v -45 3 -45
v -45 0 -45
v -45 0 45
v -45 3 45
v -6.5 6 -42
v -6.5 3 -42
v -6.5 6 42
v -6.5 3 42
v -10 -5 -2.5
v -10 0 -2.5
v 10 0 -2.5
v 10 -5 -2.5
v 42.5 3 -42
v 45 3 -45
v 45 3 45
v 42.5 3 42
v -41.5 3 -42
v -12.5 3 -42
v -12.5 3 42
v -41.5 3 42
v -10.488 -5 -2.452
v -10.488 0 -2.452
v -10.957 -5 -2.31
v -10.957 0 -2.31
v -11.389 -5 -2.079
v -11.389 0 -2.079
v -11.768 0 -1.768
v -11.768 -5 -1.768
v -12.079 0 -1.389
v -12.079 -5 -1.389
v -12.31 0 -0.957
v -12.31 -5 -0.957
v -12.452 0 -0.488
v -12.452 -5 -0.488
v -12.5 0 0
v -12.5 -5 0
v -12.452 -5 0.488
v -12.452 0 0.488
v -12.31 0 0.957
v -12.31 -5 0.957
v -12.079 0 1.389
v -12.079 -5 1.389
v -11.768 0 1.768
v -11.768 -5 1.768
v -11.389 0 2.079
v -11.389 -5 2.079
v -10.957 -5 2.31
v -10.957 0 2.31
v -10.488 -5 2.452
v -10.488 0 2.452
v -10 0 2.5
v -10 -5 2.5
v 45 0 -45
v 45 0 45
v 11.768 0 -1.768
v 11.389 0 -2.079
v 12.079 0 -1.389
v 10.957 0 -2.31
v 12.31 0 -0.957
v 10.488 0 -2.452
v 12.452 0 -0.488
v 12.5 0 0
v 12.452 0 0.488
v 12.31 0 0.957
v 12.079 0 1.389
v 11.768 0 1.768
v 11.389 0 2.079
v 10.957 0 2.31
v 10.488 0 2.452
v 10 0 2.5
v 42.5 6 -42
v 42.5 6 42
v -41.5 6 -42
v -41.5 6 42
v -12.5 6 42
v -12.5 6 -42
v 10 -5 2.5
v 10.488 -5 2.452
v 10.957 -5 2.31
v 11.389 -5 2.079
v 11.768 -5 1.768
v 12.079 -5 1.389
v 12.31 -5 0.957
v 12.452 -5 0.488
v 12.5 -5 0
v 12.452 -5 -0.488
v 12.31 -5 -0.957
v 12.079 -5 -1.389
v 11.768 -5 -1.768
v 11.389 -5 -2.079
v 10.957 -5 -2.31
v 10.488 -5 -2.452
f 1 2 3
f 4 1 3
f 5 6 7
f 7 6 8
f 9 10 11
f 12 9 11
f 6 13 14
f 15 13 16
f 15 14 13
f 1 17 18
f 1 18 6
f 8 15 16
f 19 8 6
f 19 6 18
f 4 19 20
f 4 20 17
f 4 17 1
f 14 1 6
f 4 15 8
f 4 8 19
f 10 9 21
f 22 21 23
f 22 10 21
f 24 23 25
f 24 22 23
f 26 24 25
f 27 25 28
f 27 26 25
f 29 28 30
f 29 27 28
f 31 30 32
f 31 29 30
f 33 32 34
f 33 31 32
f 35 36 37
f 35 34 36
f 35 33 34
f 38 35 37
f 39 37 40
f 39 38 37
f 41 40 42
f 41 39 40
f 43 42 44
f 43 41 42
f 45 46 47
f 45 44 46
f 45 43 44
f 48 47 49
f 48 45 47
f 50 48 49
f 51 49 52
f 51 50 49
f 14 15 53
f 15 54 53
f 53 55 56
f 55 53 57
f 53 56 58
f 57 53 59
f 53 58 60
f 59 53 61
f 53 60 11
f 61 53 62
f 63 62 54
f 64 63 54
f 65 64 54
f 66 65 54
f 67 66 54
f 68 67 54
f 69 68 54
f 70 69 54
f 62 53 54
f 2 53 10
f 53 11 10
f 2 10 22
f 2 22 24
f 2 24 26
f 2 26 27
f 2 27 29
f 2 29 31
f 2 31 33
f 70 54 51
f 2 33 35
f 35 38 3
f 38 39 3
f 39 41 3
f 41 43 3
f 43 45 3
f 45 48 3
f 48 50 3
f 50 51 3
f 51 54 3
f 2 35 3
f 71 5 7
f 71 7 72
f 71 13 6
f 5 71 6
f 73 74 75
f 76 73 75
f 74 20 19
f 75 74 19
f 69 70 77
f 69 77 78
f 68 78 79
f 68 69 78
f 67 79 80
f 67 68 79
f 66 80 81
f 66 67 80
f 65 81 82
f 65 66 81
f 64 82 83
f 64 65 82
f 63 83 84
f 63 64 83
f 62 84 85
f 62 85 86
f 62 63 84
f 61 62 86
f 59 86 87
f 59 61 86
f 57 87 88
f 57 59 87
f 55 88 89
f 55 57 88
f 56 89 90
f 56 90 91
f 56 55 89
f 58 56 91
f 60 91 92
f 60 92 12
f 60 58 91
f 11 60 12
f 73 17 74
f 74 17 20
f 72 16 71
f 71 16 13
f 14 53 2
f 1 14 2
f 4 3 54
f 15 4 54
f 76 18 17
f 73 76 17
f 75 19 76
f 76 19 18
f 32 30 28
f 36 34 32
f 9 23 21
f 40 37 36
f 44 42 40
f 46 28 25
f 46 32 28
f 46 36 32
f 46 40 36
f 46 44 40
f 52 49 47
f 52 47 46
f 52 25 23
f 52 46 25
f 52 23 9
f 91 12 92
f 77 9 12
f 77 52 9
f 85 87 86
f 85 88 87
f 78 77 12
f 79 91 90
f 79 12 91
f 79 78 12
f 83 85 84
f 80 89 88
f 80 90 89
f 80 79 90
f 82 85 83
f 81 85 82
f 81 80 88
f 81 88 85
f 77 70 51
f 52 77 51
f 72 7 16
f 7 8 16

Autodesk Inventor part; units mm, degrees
ref_plane "YZ Plane" through (0, 0, 0) normal (1, 0, 0) x (0, 1, 0)
ref_plane "XZ Plane" through (0, 0, 0) normal (0, 1, 0) x (-1, 0, 0)
ref_plane "XY Plane" through (0, 0, 0) normal (0, 0, 1) x (1, 0, 0)
sketch "Náčrt1" plane through (0, 0, 0) normal (0, 1, 0) x (-1, 0, 0)
  line L0 (0, -63) -> (0, 63) projected
  line L1 (-63, 0) -> (63, 0) projected
  line L2 (45, 45) -> (-45, 45)
  line L3 (-45, 45) -> (-45, -45)
  line L4 (-45, -45) -> (45, -45)
  line L5 (45, -45) -> (45, 45)
  point P0 (0, 0)
  dimension "d0" = 90
  dimension "d1" = 90
extrude "Vysunutí1" add sketch "Náčrt1" along normal blind 3
sketch "Náčrt2" plane through (0, 3, 0) normal (0, 1, 0) x (1, 0, 0)
  line L0 (0, 63) -> (0, -63) projected
  line L1 (63, 0) -> (-63, 0) projected
  line L2 (-41.5, -42) -> (-12.5, -42)
  line L3 (-12.5, -42) -> (-12.5, 42)
  line L4 (-12.5, 42) -> (-41.5, 42)
  line L5 (-41.5, 42) -> (-41.5, -42)
  line L6 (-45, 45) -> (-45, -45) projected
  point P0 (0, 0)
  dimension "d4" = 3.5
  dimension "d5" = 29
  dimension "d6" = 84
extrude "Vysunutí2" add sketch "Náčrt2" along normal blind 3
sketch "Náčrt3" plane through (0, 3, 0) normal (0, 1, 0) x (1, 0, 0)
  line L0 (-12.5, -42) -> (-12.5, 42) projected
  line L1 (0, 63) -> (0, -63) projected
  line L2 (63, 0) -> (-63, 0) projected
  line L3 (-6.5, -42) -> (42.5, -42)
  line L4 (42.5, -42) -> (42.5, 42)
  line L5 (42.5, 42) -> (-6.5, 42)
  line L6 (-6.5, 42) -> (-6.5, -42)
  point P0 (0, 0)
  point P1 (18, -42)
  dimension "d9" = 6
  dimension "d10" = 49
  dimension "d11" = 84
extrude "Vysunutí3" add sketch "Náčrt3" along normal blind 3
sketch "Náčrt6" plane through (0, 0, 0) normal (0, -1, 0) x (1, 0, 0)
  line L0 (0, 63) -> (0, -63) projected
  line L1 (-63, 0) -> (63, 0) projected
  line L2 (-10, 0) -> (10, 0) construction
  line L3 (-6.5, -42) -> (-6.5, 42) projected
  line L4 (-10, -2.5) -> (10, -2.5)
  line L5 (10, 2.5) -> (-10, 2.5)
  arc A0 (-10, 2.5) -> (-10, -2.5) centre (-10, 0) ccw
  arc A1 (10, -2.5) -> (10, 2.5) centre (10, 0) ccw
  point P0 (0, 0)
  point P1 (0, 0)
  dimension "d14" = 20
  dimension "d15" = 5
extrude "Vysunutí4" add sketch "Náčrt6" along normal blind 5
properties part number "víčko"
